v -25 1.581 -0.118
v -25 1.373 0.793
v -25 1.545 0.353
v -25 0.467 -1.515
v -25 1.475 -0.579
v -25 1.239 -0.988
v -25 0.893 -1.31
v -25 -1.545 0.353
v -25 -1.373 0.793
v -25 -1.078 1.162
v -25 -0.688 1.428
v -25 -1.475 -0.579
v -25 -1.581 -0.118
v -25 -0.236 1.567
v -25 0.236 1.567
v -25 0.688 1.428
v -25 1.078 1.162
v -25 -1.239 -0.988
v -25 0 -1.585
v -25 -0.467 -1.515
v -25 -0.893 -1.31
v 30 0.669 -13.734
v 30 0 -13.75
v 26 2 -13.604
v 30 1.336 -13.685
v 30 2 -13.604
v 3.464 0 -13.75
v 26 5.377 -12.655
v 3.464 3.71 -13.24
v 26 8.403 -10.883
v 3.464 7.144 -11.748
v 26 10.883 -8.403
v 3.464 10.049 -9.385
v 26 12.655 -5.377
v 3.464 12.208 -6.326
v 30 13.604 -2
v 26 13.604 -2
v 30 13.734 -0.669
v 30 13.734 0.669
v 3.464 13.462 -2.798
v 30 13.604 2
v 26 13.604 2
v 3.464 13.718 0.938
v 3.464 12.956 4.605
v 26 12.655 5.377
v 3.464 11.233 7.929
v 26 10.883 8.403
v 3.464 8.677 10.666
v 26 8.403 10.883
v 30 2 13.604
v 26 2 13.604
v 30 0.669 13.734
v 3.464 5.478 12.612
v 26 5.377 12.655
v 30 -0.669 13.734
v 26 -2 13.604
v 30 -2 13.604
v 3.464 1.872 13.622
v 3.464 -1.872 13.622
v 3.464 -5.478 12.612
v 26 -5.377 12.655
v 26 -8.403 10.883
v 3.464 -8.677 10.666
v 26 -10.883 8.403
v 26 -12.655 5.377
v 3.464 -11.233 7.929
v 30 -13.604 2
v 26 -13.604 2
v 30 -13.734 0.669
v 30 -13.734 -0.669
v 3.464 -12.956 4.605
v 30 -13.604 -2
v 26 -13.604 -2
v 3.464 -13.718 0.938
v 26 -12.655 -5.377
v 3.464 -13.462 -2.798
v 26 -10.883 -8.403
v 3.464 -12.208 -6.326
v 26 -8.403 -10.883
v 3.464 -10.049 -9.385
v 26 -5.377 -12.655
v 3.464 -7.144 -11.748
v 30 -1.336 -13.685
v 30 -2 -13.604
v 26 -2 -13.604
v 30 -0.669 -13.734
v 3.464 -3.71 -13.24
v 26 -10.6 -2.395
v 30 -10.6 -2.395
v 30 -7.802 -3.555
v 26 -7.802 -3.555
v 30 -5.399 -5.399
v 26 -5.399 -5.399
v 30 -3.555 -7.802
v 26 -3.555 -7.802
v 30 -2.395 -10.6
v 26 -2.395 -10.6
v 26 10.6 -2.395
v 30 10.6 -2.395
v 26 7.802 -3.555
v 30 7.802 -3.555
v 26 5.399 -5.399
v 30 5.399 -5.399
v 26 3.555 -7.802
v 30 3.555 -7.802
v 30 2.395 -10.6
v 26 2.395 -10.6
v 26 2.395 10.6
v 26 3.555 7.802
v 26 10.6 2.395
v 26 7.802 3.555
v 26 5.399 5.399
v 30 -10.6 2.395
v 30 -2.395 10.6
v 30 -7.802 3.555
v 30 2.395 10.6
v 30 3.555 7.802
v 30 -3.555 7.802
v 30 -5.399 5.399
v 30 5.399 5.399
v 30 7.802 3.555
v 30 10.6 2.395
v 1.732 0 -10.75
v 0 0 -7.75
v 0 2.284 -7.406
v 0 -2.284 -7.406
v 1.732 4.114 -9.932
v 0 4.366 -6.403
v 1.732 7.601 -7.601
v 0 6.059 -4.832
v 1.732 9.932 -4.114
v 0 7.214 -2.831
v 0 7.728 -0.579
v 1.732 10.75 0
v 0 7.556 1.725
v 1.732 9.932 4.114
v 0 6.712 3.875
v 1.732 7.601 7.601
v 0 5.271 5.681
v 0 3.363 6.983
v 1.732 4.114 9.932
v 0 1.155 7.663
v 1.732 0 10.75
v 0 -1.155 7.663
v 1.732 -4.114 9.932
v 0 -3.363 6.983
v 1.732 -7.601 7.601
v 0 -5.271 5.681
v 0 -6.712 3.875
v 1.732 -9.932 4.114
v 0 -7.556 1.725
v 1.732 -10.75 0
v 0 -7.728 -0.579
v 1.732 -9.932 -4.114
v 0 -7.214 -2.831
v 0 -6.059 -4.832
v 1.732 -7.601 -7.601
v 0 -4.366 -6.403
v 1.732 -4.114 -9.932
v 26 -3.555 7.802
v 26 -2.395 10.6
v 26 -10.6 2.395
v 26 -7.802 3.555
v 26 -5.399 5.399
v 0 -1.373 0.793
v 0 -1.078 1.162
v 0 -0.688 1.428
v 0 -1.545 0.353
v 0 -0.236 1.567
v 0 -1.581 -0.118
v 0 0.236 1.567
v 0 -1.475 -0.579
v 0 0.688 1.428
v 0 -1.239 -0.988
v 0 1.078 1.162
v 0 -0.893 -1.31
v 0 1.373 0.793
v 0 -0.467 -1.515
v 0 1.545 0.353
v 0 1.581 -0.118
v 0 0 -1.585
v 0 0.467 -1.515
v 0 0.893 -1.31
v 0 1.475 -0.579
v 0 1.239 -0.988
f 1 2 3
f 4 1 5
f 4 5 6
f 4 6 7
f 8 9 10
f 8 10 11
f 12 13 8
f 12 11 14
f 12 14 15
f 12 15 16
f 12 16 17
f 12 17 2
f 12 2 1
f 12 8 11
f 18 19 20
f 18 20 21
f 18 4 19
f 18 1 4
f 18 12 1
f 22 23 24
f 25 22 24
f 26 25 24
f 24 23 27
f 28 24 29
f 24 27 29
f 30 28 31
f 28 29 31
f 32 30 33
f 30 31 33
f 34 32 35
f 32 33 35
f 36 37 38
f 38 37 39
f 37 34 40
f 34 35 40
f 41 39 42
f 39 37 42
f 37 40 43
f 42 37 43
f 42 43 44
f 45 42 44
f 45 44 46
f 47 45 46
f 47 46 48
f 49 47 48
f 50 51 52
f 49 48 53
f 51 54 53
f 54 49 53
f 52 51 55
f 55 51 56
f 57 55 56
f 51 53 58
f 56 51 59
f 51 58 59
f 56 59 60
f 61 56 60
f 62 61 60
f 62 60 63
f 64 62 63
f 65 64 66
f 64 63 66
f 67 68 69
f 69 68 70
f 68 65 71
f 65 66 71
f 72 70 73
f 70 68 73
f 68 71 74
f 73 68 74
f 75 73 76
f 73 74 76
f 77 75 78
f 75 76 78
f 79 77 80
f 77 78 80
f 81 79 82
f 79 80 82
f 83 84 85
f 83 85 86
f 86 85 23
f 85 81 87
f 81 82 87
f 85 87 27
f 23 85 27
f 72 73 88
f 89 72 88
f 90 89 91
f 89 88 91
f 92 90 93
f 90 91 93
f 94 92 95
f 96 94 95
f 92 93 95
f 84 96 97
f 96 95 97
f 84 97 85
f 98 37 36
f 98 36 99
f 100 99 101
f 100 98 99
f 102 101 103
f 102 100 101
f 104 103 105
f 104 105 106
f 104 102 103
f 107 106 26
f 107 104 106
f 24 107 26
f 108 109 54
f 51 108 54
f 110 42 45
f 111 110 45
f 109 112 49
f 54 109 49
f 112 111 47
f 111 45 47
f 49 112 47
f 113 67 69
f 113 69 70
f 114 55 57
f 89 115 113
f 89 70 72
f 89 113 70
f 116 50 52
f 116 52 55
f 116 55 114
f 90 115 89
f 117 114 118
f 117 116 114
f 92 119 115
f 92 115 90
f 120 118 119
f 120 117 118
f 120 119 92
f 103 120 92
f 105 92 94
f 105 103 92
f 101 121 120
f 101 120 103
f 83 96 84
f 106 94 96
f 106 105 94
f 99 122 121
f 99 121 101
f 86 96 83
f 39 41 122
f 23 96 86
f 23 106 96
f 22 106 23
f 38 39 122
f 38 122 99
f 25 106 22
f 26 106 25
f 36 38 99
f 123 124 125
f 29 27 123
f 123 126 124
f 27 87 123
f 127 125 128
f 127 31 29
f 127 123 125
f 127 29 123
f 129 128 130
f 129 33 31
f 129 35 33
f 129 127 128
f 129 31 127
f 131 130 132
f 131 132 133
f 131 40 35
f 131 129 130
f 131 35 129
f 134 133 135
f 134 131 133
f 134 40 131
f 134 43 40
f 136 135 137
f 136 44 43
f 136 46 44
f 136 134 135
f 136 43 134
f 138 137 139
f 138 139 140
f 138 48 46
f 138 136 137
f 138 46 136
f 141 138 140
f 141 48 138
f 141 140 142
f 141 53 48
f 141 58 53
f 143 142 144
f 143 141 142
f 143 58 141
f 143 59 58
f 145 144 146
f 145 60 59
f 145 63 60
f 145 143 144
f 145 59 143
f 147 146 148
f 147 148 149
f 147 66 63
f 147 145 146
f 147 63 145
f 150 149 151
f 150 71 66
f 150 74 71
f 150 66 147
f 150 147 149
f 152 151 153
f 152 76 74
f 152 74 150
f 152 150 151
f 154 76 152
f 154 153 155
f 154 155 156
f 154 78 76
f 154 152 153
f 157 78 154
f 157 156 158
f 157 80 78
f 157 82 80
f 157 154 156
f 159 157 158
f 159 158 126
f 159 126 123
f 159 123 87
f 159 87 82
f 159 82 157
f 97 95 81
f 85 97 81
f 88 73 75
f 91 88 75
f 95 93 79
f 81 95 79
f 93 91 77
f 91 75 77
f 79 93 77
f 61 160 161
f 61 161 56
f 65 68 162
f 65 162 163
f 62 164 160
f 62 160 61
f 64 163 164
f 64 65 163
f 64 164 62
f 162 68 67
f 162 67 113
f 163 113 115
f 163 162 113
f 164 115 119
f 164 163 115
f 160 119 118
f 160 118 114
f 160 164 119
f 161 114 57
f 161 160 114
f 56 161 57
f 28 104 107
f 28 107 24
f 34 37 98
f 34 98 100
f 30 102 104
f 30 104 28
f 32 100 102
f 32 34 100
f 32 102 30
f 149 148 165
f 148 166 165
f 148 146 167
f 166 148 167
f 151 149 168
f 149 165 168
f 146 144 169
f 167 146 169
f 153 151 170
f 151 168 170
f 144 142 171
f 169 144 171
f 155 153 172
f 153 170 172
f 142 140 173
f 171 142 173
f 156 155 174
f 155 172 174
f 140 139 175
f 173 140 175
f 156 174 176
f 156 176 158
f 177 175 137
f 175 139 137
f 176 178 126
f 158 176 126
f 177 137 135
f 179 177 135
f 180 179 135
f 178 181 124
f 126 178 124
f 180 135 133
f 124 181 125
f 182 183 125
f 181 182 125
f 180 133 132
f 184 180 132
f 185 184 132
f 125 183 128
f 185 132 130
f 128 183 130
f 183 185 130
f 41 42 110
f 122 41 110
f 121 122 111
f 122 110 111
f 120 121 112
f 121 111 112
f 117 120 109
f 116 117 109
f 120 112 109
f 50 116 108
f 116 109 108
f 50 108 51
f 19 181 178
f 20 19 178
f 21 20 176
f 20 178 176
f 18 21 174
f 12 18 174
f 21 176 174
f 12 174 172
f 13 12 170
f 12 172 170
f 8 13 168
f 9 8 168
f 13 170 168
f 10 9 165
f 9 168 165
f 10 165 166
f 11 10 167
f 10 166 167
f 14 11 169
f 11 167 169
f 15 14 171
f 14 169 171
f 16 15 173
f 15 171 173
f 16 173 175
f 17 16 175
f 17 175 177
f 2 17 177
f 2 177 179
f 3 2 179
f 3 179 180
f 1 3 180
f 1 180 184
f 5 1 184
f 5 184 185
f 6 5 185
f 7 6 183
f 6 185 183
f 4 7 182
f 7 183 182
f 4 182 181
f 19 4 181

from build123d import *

# Parameters (mm, degrees)
SKETCH1_R            = 13.75
BOSS_EXTRUDE1_DEPTH  = 30
SKETCH2_R            = 1.585
BOSS_EXTRUDE2_DEPTH  = 25
CHAMFER1_SIZE        = 6
CHAMFER1_SIZE2       = 3.464101615
CUT_EXTRUDE1_START   = -4
CUT_EXTRUDE1_DEPTH   = 4
MIRROR2_START        = -4
MIRROR2_COPY_1_DEPTH = 4


with BuildPart() as part:
    # Sketch1 → Boss-Extrude1 (new body)
    with BuildSketch(Plane(origin=(0, 0, 0), x_dir=(0, 0, -1), z_dir=(1, 0, 0))):
        Circle(SKETCH1_R)
    extrude(amount=BOSS_EXTRUDE1_DEPTH)

    # Sketch2 → Boss-Extrude2 (add)
    with BuildSketch(Plane.ZY):
        with Locations(Location((0, 0, 0), (0, 0, 180))):
            Circle(SKETCH2_R)
    extrude(amount=BOSS_EXTRUDE2_DEPTH)

    # Chamfer1
    chamfer1_edges = [part.edges().sort_by_distance(p)[0] for p in [
        (0, 0, 13.75),
    ]]
    chamfer1_side = [part.faces().sort_by_distance(p)[0] for p in [
        (0, 0, 13.36109127),
    ]]
    chamfer(chamfer1_edges, length=CHAMFER1_SIZE, length2=CHAMFER1_SIZE2, reference=chamfer1_side[0])

    # Sketch3 → Cut-Extrude1 (cut)
    with BuildSketch(Plane(origin=(30, 0, 0), x_dir=(0, 0, -1), z_dir=(1, 0, 0)).offset(CUT_EXTRUDE1_START)):
        with BuildLine():
            ThreePointArc((-2, 13.60376786), (-5.398664919, 5.398664919), (-13.60376786, 2))
            ThreePointArc((-13.60376786, 2), (-9.722718241, 9.722718241), (-2, 13.60376786))
        make_face()
    cut_extrude1 = extrude(amount=CUT_EXTRUDE1_DEPTH, mode=Mode.SUBTRACT)

    # Mirror1: Cut-Extrude1 across plane
    add(cut_extrude1.mirror(Plane.XY), mode=Mode.SUBTRACT)

    # Mirror2: Cut-Extrude1 across plane
    add(cut_extrude1.mirror(Plane.ZX), mode=Mode.SUBTRACT)

    # Mirror2 copy 1 sketch → Mirror2 copy 1 (cut)
    with BuildSketch(Plane(origin=(30, 0, 0), x_dir=(0, 0, 1), z_dir=(1, 0, 0)).offset(MIRROR2_START)):
        with BuildLine():
            ThreePointArc((-2, 13.60376786), (-5.398664919, 5.398664919), (-13.60376786, 2))
            ThreePointArc((-13.60376786, 2), (-9.722718241, 9.722718241), (-2, 13.60376786))
        make_face()
    extrude(amount=MIRROR2_COPY_1_DEPTH, mode=Mode.SUBTRACT)


solid = part.part
